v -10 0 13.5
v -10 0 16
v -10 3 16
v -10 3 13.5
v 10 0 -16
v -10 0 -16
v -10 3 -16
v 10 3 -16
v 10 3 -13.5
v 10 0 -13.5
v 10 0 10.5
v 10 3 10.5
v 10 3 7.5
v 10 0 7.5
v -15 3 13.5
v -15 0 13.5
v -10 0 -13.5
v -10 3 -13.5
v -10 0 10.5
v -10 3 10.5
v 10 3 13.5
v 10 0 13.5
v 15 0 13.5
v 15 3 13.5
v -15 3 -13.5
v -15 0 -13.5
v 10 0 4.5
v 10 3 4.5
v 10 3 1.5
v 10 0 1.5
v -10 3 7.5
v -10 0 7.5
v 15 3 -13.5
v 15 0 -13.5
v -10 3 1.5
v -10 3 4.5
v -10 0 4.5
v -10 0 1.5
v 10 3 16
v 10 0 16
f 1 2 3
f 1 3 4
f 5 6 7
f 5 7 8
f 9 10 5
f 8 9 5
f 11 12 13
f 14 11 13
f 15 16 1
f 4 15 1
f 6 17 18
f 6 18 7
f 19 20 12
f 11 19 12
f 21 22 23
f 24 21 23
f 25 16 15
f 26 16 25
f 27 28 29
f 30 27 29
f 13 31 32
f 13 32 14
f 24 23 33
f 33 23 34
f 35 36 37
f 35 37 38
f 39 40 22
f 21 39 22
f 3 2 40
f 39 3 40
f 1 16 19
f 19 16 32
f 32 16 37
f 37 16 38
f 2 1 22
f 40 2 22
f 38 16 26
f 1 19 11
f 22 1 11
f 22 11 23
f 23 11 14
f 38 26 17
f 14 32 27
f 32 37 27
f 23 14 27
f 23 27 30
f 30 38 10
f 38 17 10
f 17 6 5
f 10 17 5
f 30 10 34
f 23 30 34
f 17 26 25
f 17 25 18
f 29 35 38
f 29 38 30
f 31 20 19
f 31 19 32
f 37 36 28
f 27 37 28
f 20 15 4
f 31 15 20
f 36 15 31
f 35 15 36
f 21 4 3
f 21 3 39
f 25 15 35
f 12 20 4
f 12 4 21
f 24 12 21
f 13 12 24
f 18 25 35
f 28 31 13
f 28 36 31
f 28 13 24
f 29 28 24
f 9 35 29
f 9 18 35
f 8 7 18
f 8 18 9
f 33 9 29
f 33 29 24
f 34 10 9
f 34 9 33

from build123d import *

# Parameters (mm, degrees)
SKETCH_1_W          = 20
SKETCH_1_H          = 2.5
SKETCH_1_W_2        = 30
SKETCH_1_H_2        = 27
EXTRUDE_1_DEPTH     = 3
SKETCH_2_W          = 20
SKETCH_2_H          = 3
CUT_EXTRUDE_1_DEPTH = 23.135943621


with BuildPart() as part:
    # 草图1 → 凸台-拉伸1 (new body)
    with BuildSketch(Plane(origin=(0, 0, 0), x_dir=(1, 0, 0), z_dir=(0, 1, 0))):
        with Locations((0, 14.75)):
            Rectangle(SKETCH_1_W, SKETCH_1_H)
        Rectangle(SKETCH_1_W_2, SKETCH_1_H_2)
        with Locations((0, -14.75)):
            Rectangle(SKETCH_1_W, SKETCH_1_H)
    extrude(amount=EXTRUDE_1_DEPTH)

    # 草图2 → 切除-拉伸1 (cut, through all)
    with BuildSketch(Plane(origin=(0, 3, 0), x_dir=(1, 0, 0), z_dir=(0, 1, 0))):
        with Locations((0, -9)):
            Rectangle(SKETCH_2_W, SKETCH_2_H)
        with Locations((0, -3)):
            Rectangle(SKETCH_2_W, SKETCH_2_H)
    extrude(amount=-CUT_EXTRUDE_1_DEPTH, mode=Mode.SUBTRACT)


solid = part.part
